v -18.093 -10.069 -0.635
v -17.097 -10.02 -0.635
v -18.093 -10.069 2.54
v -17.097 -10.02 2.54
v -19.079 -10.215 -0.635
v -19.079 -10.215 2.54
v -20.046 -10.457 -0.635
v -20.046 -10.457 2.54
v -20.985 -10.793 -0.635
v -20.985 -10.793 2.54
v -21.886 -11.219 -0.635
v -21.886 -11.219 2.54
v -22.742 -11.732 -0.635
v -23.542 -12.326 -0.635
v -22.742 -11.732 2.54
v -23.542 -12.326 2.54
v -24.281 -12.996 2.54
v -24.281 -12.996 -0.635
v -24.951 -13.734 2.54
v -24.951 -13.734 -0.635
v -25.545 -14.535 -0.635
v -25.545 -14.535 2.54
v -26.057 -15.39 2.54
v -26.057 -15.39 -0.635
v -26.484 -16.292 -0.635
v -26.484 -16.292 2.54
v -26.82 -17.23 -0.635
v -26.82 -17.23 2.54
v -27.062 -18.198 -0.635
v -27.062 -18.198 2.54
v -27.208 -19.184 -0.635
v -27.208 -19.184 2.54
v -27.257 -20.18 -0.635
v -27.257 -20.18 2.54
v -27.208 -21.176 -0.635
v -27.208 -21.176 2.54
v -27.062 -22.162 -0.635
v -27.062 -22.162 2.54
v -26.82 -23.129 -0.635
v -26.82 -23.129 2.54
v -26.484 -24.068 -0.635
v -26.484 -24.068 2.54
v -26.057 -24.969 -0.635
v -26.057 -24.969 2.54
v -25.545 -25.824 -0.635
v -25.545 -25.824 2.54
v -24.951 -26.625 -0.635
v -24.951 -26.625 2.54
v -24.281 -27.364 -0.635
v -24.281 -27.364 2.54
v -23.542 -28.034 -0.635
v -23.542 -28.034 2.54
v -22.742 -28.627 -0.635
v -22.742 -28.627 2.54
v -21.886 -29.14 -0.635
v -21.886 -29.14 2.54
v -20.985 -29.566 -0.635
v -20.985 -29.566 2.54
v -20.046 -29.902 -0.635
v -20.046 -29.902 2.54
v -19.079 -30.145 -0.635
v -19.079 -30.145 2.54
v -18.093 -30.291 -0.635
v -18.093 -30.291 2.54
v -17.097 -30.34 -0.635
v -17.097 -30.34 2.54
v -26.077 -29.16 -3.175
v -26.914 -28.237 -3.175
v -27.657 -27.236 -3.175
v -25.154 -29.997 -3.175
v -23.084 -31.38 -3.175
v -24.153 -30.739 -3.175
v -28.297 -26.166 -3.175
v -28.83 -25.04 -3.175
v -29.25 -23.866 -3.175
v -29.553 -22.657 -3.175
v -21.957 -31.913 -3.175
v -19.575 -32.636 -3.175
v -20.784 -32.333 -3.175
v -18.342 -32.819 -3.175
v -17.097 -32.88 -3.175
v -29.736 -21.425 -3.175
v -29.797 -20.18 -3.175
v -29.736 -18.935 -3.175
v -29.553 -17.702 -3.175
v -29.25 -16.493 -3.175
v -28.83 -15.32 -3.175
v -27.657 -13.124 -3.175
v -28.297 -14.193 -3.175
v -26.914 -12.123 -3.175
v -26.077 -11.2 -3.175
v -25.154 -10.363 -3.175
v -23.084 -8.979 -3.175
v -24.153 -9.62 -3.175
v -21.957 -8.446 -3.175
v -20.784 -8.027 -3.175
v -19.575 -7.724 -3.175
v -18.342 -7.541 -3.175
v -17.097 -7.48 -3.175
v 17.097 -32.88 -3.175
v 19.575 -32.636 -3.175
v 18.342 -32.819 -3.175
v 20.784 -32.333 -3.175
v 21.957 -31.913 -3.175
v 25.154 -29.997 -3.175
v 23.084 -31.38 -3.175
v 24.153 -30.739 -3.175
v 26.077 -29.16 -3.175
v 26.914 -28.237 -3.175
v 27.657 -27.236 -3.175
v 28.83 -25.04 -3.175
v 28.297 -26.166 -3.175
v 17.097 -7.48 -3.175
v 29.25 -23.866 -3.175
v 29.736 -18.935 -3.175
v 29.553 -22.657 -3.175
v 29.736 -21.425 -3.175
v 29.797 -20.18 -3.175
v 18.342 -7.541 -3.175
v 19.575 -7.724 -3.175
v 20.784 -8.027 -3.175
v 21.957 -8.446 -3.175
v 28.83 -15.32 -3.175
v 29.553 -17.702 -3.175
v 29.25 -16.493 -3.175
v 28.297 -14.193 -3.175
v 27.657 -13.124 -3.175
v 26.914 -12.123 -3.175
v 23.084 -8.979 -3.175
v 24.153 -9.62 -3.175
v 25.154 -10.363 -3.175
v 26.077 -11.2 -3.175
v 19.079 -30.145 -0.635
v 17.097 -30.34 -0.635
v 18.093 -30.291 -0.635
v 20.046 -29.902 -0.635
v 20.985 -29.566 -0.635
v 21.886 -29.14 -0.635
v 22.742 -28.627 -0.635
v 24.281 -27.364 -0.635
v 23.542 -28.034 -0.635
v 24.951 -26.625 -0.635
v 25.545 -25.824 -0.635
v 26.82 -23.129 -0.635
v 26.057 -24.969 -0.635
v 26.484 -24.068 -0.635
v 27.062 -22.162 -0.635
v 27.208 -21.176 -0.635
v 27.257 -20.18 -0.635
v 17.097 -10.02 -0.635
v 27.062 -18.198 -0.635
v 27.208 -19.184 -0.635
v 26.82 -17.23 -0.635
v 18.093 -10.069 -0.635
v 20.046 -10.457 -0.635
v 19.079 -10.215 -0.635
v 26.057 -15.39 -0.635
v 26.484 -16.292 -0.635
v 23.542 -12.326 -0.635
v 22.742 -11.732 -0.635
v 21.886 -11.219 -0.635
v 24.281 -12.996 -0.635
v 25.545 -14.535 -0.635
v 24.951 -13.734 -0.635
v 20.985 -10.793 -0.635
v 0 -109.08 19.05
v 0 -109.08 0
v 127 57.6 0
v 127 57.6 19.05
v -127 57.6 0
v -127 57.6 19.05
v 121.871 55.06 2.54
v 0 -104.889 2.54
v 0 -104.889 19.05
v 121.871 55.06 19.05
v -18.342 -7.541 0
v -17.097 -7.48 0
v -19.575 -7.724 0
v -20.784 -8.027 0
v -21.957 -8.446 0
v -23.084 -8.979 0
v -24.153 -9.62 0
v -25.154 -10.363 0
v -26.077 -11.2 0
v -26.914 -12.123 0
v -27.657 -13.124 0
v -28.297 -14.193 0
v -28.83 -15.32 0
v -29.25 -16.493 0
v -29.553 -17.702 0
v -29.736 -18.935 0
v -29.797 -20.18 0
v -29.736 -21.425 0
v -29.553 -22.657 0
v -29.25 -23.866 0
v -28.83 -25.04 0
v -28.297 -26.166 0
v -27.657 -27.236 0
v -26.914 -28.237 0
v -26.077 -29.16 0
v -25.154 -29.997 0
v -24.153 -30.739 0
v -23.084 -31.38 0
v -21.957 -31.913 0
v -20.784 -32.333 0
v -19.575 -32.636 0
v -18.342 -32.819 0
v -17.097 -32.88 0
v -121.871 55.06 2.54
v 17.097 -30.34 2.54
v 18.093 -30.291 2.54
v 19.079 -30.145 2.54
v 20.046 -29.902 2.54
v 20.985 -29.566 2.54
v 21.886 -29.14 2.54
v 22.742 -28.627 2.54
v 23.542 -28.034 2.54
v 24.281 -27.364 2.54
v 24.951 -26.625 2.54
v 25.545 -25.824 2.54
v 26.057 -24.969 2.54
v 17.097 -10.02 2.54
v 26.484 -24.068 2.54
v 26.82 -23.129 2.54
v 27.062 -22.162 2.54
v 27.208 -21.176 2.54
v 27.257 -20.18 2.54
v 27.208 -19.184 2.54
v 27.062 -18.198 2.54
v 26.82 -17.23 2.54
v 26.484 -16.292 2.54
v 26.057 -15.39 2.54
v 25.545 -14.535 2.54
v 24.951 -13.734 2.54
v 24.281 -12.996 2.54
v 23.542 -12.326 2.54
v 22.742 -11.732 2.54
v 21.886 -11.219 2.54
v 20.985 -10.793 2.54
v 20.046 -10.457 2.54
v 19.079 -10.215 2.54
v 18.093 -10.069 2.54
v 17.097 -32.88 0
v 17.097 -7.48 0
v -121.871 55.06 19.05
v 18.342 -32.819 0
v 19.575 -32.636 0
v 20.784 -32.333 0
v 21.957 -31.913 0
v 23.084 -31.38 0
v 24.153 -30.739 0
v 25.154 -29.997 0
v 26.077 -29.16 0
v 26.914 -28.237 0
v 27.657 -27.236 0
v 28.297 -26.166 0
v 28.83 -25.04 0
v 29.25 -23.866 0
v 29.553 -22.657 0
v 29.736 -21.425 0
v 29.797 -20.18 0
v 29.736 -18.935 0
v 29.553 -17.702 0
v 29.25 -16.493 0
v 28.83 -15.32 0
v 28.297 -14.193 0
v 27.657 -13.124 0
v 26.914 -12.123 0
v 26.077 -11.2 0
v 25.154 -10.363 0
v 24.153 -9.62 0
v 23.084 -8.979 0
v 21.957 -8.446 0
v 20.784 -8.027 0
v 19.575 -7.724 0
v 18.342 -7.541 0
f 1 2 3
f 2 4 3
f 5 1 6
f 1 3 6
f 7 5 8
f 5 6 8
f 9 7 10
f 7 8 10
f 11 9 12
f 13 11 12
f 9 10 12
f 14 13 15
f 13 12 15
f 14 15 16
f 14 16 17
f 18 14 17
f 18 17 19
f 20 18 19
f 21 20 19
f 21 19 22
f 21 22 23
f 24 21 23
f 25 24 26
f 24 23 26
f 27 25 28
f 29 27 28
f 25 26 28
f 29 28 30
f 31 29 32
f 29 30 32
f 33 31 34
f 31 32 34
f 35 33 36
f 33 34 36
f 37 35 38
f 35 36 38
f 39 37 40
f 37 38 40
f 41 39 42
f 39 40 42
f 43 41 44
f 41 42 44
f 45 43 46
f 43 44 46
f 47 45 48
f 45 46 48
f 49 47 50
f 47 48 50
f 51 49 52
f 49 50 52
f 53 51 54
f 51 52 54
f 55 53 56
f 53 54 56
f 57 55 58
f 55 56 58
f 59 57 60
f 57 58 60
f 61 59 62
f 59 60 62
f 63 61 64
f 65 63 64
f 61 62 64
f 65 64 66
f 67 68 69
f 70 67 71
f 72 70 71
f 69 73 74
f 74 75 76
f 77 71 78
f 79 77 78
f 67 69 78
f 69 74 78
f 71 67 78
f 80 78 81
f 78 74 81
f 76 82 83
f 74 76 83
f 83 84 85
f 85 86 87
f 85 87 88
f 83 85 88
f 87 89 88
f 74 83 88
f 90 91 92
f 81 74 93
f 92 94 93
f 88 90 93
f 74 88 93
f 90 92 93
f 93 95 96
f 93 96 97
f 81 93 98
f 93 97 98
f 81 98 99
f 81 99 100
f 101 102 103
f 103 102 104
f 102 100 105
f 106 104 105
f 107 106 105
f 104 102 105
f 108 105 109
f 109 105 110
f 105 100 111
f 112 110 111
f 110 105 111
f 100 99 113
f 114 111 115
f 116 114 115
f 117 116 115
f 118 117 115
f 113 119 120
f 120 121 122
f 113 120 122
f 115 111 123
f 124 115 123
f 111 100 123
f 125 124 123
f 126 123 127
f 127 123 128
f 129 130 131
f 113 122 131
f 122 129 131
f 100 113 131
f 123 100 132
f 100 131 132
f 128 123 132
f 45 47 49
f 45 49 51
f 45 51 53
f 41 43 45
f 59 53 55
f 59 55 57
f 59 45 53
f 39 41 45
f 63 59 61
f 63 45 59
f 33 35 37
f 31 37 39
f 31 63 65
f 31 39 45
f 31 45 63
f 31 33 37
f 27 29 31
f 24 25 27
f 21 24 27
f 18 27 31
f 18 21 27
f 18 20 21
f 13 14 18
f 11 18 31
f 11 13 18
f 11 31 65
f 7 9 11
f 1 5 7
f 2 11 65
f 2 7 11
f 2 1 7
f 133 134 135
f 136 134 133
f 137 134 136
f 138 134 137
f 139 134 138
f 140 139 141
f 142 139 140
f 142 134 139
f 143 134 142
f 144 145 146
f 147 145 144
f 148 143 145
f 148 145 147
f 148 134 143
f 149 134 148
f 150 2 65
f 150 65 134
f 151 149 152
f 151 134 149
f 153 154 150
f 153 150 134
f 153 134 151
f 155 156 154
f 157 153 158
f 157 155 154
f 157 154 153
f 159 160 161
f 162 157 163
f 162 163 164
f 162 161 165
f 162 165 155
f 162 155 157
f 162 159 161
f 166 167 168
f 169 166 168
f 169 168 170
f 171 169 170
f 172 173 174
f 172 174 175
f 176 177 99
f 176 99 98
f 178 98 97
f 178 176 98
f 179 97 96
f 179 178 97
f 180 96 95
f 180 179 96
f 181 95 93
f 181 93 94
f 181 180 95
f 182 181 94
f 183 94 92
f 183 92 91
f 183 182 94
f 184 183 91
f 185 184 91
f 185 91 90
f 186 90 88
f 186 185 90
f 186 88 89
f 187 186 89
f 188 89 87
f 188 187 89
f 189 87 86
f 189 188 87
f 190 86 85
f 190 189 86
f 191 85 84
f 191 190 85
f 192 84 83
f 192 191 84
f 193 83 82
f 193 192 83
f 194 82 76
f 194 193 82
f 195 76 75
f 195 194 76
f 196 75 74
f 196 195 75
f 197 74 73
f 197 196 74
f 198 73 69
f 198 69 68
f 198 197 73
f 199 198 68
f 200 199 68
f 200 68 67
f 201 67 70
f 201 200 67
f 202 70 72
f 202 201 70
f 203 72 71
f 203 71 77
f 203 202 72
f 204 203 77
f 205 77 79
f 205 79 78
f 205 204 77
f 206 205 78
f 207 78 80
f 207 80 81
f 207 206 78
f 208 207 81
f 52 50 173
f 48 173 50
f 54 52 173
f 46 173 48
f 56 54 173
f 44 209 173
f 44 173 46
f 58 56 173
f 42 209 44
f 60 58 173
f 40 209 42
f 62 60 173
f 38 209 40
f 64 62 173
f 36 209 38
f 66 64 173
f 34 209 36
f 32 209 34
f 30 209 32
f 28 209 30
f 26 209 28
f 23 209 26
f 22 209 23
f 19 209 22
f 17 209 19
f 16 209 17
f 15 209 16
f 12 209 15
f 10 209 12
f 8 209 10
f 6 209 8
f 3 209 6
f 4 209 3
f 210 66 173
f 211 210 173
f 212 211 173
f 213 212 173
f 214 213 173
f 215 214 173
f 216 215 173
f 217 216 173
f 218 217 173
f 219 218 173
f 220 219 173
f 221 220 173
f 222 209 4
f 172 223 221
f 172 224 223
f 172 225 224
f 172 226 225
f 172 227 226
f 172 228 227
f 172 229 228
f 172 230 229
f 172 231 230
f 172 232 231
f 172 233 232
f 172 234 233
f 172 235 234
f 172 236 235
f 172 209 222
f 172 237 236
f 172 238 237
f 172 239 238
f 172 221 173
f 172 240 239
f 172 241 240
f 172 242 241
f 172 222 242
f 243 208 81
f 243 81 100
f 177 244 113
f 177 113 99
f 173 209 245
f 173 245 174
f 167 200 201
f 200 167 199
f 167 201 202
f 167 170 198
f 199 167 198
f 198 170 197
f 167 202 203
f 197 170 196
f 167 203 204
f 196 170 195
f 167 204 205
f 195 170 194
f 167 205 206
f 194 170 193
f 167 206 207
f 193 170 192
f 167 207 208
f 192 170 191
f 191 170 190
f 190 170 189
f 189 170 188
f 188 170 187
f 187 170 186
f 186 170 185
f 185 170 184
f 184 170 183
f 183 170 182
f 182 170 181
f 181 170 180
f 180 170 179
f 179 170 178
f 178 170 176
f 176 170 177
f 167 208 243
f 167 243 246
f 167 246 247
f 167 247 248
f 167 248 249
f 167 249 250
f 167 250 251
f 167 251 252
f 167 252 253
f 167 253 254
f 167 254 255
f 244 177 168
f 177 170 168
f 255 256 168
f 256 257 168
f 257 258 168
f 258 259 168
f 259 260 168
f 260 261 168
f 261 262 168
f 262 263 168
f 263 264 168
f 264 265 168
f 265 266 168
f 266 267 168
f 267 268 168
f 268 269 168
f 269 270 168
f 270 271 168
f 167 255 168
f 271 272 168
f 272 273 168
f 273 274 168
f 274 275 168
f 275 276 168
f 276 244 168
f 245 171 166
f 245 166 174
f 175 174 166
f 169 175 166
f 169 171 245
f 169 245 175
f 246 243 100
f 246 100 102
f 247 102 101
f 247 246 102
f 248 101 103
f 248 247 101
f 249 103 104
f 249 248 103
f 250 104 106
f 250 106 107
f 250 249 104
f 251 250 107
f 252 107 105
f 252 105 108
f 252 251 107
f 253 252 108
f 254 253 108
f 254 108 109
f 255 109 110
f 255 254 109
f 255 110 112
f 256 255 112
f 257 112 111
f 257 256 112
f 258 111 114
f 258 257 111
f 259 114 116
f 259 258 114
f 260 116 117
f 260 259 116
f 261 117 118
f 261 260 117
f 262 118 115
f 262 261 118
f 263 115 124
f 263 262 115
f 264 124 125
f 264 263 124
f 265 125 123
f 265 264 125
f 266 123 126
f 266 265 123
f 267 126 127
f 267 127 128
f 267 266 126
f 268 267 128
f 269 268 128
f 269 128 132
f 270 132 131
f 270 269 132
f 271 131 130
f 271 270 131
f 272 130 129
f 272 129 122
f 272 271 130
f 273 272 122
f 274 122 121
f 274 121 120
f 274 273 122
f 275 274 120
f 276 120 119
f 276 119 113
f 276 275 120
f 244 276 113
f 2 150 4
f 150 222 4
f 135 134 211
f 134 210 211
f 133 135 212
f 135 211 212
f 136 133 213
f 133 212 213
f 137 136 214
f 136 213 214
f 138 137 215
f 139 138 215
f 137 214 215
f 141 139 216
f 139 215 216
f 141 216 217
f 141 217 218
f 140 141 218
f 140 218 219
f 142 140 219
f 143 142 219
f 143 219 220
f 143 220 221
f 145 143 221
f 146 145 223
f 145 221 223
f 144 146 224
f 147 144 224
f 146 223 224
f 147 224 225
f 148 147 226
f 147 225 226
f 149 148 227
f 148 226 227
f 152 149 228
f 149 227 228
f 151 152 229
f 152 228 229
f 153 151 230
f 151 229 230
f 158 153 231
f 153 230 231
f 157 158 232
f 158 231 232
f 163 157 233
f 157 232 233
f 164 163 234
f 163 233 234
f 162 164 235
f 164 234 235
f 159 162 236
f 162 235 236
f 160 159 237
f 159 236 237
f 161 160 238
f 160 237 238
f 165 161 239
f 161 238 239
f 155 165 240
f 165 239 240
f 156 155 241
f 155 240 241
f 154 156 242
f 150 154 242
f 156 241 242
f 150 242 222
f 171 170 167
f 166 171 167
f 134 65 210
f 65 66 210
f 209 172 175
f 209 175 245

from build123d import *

# Parameters (mm, degrees)
F1_DEPTH = 3.175
F2_DEPTH = 19.05
F3_T     = -2.54


with BuildPart() as f1:
    # F0 (on Top) → F1 (new body)
    with BuildSketch(Plane.XY):
        with BuildLine():
            Line((17.0969952226, -7.4797603572), (-17.0969952226, -7.4797603572))
            ThreePointArc((-17.0969952226, -7.4797603572), (-29.7969952226, -20.1797603572), (-17.0969952226, -32.8797603572))
            Line((-17.0969952226, -32.8797603572), (17.0969952226, -32.8797603572))
            ThreePointArc((17.0969952226, -32.8797603572), (29.7969952226, -20.1797603572), (17.0969952226, -7.4797603572))
        make_face()
    extrude(amount=-F1_DEPTH)

    # F0 (on Top) + F1_face (on face) → F2 (join)
    with BuildSketch(Plane.XY):
        Polygon((127, 57.6001799476), (-127, 57.6001799476), (0, -109.0797603572), align=None)
        with BuildLine():
            ThreePointArc((-17.0969952226, -32.8797603572), (-29.7969952226, -20.1797603572), (-17.0969952226, -7.4797603572))
            Line((-17.0969952226, -7.4797603572), (17.0969952226, -7.4797603572))
            ThreePointArc((17.0969952226, -7.4797603572), (29.7969952226, -20.1797603572), (17.0969952226, -32.8797603572))
            Line((17.0969952226, -32.8797603572), (-17.0969952226, -32.8797603572))
        make_face(mode=Mode.SUBTRACT)
    with BuildSketch(Plane(origin=(0, -20.1797603572, 0), x_dir=(1, 0, 0), z_dir=(0, 0, 1))):
        with BuildLine():
            ThreePointArc((17.0969952226, -12.7), (29.7969952226, 0), (17.0969952226, 12.7))
            Line((17.0969952226, 12.7), (-17.0969952226, 12.7))
            ThreePointArc((-17.0969952226, 12.7), (-29.7969952226, 0), (-17.0969952226, -12.7))
            Line((-17.0969952226, -12.7), (17.0969952226, -12.7))
        make_face()
    extrude(amount=F2_DEPTH)

    # F3
    f3_openings = [f1.faces().sort_by_distance(p)[0] for p in [
        (0, 2.0402, 19.05),
    ]]
    offset(amount=F3_T, openings=f3_openings, kind=Kind.INTERSECTION)


solid = f1.part
